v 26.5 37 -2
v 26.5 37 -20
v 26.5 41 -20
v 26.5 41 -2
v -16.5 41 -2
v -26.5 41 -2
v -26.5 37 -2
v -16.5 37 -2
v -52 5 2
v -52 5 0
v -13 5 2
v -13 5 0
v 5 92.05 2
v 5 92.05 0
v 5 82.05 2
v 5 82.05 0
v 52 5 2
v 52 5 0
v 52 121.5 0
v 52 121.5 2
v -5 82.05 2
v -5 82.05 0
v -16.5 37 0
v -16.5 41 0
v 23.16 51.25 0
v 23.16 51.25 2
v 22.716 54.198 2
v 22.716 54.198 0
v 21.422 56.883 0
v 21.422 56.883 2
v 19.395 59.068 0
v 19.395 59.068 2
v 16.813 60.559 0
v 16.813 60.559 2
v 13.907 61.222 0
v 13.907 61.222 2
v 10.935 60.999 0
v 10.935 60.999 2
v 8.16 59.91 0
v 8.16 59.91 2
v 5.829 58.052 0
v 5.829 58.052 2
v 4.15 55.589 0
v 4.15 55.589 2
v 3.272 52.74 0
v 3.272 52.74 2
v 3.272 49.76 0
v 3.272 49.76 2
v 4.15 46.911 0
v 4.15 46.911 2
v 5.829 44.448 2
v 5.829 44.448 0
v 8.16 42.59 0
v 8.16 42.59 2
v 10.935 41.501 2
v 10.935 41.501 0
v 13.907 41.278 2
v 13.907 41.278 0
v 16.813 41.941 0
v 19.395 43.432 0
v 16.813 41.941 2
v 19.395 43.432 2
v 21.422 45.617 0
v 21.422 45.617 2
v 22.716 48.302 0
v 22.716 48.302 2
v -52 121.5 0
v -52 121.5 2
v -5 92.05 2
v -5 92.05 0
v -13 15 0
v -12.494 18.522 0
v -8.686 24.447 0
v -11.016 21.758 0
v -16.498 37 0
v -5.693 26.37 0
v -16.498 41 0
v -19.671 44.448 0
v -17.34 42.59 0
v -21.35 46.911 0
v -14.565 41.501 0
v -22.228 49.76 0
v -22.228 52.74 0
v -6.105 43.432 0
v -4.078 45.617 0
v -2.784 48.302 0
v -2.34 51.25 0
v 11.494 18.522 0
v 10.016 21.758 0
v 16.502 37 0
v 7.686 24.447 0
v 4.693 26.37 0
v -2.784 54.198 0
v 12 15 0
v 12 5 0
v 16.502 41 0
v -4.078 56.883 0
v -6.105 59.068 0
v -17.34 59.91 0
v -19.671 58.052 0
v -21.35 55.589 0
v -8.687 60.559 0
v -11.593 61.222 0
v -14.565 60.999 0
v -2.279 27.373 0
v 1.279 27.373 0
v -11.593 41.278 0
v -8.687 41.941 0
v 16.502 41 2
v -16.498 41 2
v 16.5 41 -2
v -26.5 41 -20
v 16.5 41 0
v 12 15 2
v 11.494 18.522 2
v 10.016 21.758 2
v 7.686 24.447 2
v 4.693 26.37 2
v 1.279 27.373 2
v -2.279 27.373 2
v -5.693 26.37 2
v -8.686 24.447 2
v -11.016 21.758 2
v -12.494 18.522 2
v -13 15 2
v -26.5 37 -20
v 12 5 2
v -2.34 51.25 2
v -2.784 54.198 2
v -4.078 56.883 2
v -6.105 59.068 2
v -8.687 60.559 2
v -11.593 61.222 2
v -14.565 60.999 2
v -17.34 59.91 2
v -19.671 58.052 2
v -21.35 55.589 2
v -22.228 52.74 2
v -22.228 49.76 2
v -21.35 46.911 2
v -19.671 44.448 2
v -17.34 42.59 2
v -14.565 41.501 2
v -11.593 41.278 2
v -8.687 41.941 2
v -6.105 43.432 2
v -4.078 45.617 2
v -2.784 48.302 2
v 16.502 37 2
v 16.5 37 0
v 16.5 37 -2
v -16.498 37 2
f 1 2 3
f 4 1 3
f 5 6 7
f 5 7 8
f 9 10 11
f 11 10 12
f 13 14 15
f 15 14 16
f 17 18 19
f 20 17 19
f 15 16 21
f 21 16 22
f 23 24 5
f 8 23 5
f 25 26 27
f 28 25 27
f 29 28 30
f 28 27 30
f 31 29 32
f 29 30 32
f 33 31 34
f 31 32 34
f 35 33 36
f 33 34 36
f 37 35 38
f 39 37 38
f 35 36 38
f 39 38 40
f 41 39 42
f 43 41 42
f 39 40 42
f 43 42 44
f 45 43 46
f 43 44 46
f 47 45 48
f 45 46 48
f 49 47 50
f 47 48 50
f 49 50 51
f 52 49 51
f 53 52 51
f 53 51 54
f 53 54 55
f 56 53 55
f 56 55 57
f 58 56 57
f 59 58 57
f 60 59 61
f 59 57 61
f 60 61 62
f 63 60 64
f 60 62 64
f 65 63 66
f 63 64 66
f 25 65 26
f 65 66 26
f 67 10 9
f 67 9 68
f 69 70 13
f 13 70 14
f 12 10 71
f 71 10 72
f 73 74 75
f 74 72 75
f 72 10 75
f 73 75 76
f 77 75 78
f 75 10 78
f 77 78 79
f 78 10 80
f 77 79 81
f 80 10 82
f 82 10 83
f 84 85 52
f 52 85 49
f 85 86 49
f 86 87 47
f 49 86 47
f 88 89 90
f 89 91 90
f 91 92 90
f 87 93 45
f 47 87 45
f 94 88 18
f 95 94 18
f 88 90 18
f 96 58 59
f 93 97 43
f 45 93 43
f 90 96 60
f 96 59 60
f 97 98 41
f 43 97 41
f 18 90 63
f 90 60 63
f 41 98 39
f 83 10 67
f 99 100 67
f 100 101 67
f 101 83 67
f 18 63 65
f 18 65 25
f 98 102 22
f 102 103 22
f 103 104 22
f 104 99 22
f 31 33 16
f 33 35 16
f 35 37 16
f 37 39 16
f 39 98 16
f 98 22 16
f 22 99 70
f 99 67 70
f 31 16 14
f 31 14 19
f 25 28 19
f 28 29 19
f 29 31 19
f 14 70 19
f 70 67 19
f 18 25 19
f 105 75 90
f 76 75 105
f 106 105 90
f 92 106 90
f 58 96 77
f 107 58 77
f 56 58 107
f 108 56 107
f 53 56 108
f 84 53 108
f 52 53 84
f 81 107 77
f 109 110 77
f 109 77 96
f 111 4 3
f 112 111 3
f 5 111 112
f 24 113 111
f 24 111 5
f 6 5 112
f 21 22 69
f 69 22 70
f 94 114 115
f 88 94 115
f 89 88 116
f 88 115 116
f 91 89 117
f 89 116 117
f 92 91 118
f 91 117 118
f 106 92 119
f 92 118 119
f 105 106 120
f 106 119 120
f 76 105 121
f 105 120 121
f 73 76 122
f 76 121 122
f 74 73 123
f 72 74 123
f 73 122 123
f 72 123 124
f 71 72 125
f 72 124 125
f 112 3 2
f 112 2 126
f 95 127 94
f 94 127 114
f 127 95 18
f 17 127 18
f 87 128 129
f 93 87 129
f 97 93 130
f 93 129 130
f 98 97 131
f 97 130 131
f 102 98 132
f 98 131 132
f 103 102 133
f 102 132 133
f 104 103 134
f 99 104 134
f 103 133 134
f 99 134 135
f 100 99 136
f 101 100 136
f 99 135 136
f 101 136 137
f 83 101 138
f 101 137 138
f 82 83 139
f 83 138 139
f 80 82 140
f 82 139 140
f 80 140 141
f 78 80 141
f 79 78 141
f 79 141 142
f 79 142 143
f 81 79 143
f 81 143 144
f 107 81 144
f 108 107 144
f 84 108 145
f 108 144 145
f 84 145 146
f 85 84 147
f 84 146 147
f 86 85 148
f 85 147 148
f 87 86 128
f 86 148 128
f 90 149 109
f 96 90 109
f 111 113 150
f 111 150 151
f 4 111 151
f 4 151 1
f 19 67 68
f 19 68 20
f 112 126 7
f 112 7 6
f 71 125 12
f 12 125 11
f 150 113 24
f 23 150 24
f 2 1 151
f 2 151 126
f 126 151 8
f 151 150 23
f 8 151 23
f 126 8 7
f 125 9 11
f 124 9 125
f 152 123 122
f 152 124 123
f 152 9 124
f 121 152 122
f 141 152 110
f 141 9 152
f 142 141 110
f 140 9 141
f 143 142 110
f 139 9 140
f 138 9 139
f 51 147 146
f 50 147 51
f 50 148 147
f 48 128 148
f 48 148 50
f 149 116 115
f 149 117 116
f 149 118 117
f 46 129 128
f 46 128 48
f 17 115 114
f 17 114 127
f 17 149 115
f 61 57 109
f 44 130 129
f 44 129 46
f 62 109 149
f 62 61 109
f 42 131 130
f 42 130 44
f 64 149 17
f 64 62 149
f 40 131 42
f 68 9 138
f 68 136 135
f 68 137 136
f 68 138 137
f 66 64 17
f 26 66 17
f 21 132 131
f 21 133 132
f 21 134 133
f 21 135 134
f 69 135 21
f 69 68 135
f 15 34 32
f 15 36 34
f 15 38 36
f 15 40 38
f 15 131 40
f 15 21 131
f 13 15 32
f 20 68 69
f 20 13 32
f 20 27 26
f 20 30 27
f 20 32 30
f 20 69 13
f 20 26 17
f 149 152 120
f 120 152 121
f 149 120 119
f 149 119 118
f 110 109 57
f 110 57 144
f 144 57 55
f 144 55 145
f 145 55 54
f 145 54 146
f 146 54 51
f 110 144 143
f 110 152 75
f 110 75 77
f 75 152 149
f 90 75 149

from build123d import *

# Parameters (mm, degrees)
SKETCH_1_W          = 104
SKETCH_1_H          = 116.5
EXTRUDE_1_DEPTH     = 2
CUT_EXTRUDE_1_DEPTH = 4
SKETCH_5_W          = 53
SKETCH_5_H          = 4
EXTRUDE_2_DEPTH     = 20
SKETCH_6_W          = 10
SKETCH_6_H          = 2
CUT_EXTRUDE_2_DEPTH = 20
SKETCH_8_W          = 33
SKETCH_8_H          = 4
CUT_EXTRUDE_3_DEPTH = 2
SKETCH_9_R          = 10
CUT_EXTRUDE_4_DEPTH = 2
SKETCH_10_W         = 8.5
SKETCH_10_H         = 8.5
SKETCH_10_W_2       = 0.75
SKETCH_10_H_2       = 0.75
CUT_EXTRUDE_5_DEPTH = 2


with BuildPart() as part:
    # 스케치1 → 보스-돌출1 (new body)
    with BuildSketch(Plane.XY):
        with Locations((0, 63.25)):
            Rectangle(SKETCH_1_W, SKETCH_1_H)
    extrude(amount=EXTRUDE_1_DEPTH)

    # 스케치3 → 컷-돌출1 (cut)
    with BuildSketch(Plane.XY.offset(2)):
        with BuildLine():
            Line((-13, 15), (-13, 5))
            Line((-13, 5), (12, 5))
            Line((12, 5), (12, 15))
            ThreePointArc((12, 15), (-0.5, 27.5), (-13, 15))
        make_face()
    extrude(amount=-CUT_EXTRUDE_1_DEPTH, mode=Mode.SUBTRACT)

    # 스케치8 → 컷-돌출3 (cut)
    with BuildSketch(Plane.XY.offset(2)):
        with Locations((0.001833015, 39)):
            Rectangle(SKETCH_8_W, SKETCH_8_H)
    extrude(amount=-CUT_EXTRUDE_3_DEPTH, mode=Mode.SUBTRACT)

    # 스케치9 → 컷-돌출4 (cut)
    with BuildSketch(Plane.XY.offset(2)):
        with Locations((-12.34, 51.25)):
            Circle(SKETCH_9_R)
        with Locations((13.16, 51.25)):
            Circle(SKETCH_9_R)
    extrude(amount=-CUT_EXTRUDE_4_DEPTH, mode=Mode.SUBTRACT)

    # 스케치10 → 컷-돌출5 (cut)
    # profile 1 of 3: a face of its own
    with BuildSketch(Plane(origin=(0, 0, 0), x_dir=(-1, 0, 0), z_dir=(0, 0, -1))):
        Polygon((4.25, 91.3), (4.25, 92.05), (-5, 92.05), (-5, 82.05), (5, 82.05), (5, 91.3), align=None)
        with Locations((0, 87.05)):
            Rectangle(SKETCH_10_W, SKETCH_10_H, mode=Mode.SUBTRACT)
    # profile 2 of 3: a face of its own
    with BuildSketch(Plane(origin=(0, 0, 0), x_dir=(-1, 0, 0), z_dir=(0, 0, -1))):
        with Locations((0, 87.05)):
            Rectangle(SKETCH_10_W, SKETCH_10_H)
    # profile 3 of 3: a face of its own
    with BuildSketch(Plane(origin=(0, 0, 0), x_dir=(-1, 0, 0), z_dir=(0, 0, -1))):
        with Locations((4.625, 91.675)):
            Rectangle(SKETCH_10_W_2, SKETCH_10_H_2)
    extrude(amount=-CUT_EXTRUDE_5_DEPTH, mode=Mode.SUBTRACT)


with BuildPart() as body_2:
    # 스케치5 → 보스-돌출2 (new body)
    with BuildSketch(Plane(origin=(0, 0, 0), x_dir=(-1, 0, 0), z_dir=(0, 0, -1))):
        with Locations((0, 39)):
            Rectangle(SKETCH_5_W, SKETCH_5_H)
    extrude(amount=EXTRUDE_2_DEPTH)

    # 스케치6 → 컷-돌출2 (cut)
    with BuildSketch(Plane(origin=(0, 41, 0), x_dir=(1, 0, 0), z_dir=(0, 1, 0))):
        with Locations((21.5, 1)):
            Rectangle(SKETCH_6_W, SKETCH_6_H)
        with Locations((-21.5, 1)):
            Rectangle(SKETCH_6_W, SKETCH_6_H)
    extrude(amount=-CUT_EXTRUDE_2_DEPTH, mode=Mode.SUBTRACT)


solid = Compound([part.part, body_2.part])
